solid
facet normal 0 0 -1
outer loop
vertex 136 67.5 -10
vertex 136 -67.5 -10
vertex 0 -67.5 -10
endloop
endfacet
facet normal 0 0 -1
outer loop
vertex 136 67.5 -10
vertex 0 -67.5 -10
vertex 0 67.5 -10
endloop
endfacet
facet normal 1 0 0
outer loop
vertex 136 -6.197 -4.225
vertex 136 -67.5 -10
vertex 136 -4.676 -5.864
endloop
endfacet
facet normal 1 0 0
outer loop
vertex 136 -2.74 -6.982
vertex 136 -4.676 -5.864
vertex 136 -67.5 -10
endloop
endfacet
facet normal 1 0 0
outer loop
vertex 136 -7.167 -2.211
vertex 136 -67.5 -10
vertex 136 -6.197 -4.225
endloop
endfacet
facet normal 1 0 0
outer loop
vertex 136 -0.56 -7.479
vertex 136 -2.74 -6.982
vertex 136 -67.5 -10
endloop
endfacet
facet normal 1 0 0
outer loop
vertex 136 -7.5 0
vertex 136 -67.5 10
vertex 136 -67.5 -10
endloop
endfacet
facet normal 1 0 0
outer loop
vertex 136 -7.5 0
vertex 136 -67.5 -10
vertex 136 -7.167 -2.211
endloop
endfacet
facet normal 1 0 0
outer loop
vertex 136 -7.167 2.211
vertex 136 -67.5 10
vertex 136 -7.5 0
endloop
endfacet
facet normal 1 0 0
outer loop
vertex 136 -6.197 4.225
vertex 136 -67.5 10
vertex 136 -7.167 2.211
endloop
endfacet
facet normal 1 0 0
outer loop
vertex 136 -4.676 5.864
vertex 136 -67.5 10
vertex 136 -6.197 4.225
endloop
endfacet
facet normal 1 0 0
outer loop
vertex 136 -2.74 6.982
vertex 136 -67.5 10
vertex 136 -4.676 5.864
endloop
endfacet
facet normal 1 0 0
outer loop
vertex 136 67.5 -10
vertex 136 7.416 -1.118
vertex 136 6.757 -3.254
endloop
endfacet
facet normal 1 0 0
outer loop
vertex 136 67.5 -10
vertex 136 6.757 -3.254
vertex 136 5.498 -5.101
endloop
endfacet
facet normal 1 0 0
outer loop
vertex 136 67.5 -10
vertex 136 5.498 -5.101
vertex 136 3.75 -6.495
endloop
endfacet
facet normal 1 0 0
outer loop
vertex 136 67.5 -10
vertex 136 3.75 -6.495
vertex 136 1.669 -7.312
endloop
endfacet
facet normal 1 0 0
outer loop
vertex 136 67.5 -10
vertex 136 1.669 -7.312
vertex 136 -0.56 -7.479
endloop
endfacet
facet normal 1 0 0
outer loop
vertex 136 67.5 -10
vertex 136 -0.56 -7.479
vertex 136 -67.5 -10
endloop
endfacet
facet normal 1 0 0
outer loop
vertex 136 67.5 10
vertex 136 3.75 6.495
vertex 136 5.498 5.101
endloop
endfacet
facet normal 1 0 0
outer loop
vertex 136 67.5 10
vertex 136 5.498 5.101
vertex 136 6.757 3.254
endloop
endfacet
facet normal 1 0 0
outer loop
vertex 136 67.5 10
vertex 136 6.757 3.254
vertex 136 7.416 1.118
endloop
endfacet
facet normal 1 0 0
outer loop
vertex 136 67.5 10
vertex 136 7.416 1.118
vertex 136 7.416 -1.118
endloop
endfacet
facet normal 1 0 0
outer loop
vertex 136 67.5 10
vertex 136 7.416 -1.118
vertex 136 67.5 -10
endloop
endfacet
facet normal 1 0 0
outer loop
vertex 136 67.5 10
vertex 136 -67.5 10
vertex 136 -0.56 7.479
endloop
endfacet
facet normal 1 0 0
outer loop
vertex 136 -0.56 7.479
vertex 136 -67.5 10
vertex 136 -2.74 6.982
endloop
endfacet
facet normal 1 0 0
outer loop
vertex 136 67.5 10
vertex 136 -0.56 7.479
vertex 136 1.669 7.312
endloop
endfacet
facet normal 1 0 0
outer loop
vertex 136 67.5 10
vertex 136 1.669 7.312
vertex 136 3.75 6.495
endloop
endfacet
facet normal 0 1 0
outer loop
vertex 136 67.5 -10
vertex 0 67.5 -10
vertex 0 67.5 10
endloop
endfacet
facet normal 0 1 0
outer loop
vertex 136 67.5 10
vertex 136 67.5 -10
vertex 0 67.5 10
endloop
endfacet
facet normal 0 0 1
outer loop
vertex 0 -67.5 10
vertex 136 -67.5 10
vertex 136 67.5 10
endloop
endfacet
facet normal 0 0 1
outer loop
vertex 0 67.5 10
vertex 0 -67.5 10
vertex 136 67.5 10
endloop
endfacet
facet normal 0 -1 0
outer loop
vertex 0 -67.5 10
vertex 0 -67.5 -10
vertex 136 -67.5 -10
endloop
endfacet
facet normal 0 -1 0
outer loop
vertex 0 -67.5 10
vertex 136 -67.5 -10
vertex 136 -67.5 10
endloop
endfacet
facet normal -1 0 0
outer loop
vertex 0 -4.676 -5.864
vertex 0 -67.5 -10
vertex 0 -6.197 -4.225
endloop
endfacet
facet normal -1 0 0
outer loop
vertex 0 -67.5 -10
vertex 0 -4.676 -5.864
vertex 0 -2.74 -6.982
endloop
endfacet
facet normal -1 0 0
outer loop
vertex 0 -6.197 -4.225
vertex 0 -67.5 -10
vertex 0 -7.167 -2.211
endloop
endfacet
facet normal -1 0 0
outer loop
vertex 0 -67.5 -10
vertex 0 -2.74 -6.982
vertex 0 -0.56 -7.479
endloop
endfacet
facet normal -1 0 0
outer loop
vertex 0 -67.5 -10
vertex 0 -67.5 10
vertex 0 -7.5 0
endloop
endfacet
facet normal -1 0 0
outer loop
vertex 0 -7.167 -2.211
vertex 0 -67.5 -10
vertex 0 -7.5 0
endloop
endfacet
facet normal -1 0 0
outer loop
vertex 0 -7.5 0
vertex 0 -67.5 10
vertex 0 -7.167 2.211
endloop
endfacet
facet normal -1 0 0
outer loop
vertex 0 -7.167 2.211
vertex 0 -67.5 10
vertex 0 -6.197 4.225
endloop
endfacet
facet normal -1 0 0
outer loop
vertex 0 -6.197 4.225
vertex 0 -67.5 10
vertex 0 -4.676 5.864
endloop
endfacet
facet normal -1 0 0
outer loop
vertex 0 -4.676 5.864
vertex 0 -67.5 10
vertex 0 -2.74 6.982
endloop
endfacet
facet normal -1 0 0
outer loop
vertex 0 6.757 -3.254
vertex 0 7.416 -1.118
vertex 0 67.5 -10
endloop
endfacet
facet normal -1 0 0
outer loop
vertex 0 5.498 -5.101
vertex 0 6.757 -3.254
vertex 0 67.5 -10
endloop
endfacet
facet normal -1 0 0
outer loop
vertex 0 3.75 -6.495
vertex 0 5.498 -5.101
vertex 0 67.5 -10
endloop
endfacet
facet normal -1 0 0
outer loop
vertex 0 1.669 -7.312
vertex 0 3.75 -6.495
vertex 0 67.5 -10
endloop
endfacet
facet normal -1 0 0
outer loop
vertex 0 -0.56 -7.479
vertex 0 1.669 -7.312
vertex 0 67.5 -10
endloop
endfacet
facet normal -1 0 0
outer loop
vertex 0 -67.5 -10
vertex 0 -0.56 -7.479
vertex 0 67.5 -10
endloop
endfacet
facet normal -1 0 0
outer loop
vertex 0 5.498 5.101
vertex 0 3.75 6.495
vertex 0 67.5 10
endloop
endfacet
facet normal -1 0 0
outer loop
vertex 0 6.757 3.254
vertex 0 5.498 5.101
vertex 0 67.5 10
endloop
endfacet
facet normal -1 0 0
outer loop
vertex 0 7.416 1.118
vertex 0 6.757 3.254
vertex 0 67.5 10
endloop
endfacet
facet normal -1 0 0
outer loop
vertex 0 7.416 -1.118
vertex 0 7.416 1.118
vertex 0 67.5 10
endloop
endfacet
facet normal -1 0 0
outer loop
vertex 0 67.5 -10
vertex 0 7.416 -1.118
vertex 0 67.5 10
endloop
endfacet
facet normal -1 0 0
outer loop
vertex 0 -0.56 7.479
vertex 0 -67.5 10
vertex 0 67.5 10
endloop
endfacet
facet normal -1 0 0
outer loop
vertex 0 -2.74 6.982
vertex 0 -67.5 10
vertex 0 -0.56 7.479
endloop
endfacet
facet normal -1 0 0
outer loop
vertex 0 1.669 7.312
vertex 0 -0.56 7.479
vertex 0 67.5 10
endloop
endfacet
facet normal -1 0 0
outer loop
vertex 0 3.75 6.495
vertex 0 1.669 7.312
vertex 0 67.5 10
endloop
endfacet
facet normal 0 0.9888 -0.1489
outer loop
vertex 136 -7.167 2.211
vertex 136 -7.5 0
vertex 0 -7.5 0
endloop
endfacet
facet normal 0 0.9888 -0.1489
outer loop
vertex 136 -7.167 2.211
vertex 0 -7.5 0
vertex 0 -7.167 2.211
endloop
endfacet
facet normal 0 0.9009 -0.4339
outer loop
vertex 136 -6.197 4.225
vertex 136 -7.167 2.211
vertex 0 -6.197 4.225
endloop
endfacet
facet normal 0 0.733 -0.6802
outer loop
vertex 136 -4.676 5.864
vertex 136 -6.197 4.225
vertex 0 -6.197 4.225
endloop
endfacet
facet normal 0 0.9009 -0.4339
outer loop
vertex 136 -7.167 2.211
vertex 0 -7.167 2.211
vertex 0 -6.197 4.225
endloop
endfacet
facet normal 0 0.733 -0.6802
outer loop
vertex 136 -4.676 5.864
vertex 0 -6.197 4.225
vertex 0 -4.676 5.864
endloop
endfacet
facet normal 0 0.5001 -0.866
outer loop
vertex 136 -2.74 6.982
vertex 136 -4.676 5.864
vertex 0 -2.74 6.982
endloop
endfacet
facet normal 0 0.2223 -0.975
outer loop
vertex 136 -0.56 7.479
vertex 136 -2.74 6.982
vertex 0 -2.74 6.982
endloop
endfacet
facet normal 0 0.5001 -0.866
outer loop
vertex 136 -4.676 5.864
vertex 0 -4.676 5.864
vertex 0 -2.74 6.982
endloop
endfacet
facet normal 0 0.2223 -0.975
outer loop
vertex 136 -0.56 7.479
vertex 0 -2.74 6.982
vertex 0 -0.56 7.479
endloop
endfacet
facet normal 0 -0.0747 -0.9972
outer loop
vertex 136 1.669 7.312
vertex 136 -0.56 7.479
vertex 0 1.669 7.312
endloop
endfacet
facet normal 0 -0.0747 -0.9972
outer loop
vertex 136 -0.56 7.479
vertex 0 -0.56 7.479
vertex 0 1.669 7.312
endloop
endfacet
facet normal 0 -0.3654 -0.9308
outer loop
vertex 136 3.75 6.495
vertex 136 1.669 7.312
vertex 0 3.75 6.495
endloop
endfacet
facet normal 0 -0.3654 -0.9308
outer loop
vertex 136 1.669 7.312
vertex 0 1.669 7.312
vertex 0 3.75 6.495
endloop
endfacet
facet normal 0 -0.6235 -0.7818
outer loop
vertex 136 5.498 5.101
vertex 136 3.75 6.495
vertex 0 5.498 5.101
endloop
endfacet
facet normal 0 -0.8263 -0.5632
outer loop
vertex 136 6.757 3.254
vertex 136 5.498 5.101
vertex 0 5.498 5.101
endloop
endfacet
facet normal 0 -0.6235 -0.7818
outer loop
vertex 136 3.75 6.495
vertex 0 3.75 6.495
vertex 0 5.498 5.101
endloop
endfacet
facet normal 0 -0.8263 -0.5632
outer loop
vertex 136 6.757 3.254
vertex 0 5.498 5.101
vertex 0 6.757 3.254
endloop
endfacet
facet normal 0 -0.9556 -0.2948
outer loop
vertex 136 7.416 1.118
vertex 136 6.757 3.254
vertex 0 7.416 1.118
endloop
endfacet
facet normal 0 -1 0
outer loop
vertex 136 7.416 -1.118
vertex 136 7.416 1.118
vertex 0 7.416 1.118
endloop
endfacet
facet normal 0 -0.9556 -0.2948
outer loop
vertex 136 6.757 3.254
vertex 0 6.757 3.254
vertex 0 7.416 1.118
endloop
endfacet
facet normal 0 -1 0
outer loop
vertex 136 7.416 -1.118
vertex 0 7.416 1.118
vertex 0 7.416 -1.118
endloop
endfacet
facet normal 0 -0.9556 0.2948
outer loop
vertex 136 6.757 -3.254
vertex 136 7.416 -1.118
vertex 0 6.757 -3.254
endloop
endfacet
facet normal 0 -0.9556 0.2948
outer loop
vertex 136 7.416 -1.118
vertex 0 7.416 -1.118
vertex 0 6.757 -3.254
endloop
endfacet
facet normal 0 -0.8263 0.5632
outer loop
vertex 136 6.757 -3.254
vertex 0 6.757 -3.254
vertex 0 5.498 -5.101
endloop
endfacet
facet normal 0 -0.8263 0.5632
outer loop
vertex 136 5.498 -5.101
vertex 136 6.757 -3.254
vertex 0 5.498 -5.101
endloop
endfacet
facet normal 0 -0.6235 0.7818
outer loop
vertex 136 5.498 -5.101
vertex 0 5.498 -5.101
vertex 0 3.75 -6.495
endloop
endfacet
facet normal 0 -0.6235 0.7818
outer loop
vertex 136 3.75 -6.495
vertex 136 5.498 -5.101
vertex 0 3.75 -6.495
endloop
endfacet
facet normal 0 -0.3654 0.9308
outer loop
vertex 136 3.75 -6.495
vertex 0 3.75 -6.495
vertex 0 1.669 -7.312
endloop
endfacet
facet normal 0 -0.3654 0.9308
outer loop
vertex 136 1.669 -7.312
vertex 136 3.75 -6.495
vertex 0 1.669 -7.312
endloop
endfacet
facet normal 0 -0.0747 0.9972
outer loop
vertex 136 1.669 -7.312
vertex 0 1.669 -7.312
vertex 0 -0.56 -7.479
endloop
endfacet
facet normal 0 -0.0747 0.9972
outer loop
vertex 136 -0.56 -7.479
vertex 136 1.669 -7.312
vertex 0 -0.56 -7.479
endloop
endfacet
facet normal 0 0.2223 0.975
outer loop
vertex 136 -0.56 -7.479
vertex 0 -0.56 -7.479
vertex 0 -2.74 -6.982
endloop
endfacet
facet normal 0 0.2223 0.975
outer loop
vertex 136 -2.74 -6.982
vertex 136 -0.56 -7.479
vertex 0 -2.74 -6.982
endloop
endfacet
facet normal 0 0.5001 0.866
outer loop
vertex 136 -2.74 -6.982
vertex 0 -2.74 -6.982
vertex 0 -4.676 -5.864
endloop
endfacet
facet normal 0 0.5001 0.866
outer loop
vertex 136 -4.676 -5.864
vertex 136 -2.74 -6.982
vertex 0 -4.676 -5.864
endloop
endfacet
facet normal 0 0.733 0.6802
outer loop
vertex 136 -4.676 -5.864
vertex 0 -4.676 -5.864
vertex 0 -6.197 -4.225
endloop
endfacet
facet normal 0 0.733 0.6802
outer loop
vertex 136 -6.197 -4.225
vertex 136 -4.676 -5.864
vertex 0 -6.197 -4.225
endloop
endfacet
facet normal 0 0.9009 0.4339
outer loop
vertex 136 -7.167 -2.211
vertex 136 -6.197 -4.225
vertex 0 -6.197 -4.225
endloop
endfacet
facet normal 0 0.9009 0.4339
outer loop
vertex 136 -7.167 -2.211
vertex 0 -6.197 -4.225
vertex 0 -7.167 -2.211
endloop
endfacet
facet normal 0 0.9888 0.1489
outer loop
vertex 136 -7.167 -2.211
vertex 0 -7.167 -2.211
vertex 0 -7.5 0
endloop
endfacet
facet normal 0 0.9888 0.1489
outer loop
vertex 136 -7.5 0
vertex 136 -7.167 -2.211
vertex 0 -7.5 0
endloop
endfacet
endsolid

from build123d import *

# Parameters (mm, degrees)
F0_W     = 135
F0_H     = 20
F1_DEPTH = 136
F3_D     = 15


with BuildPart() as f1:
    # F0 (on Right) → F1 (new body)
    with BuildSketch(Plane.YZ):
        Rectangle(F0_W, F0_H)
    extrude(amount=F1_DEPTH)

    # F3 (through all)
    with Locations(Plane.YZ.offset(136)):
        with Locations((0, 0)):
            Hole(F3_D / 2)


solid = f1.part
